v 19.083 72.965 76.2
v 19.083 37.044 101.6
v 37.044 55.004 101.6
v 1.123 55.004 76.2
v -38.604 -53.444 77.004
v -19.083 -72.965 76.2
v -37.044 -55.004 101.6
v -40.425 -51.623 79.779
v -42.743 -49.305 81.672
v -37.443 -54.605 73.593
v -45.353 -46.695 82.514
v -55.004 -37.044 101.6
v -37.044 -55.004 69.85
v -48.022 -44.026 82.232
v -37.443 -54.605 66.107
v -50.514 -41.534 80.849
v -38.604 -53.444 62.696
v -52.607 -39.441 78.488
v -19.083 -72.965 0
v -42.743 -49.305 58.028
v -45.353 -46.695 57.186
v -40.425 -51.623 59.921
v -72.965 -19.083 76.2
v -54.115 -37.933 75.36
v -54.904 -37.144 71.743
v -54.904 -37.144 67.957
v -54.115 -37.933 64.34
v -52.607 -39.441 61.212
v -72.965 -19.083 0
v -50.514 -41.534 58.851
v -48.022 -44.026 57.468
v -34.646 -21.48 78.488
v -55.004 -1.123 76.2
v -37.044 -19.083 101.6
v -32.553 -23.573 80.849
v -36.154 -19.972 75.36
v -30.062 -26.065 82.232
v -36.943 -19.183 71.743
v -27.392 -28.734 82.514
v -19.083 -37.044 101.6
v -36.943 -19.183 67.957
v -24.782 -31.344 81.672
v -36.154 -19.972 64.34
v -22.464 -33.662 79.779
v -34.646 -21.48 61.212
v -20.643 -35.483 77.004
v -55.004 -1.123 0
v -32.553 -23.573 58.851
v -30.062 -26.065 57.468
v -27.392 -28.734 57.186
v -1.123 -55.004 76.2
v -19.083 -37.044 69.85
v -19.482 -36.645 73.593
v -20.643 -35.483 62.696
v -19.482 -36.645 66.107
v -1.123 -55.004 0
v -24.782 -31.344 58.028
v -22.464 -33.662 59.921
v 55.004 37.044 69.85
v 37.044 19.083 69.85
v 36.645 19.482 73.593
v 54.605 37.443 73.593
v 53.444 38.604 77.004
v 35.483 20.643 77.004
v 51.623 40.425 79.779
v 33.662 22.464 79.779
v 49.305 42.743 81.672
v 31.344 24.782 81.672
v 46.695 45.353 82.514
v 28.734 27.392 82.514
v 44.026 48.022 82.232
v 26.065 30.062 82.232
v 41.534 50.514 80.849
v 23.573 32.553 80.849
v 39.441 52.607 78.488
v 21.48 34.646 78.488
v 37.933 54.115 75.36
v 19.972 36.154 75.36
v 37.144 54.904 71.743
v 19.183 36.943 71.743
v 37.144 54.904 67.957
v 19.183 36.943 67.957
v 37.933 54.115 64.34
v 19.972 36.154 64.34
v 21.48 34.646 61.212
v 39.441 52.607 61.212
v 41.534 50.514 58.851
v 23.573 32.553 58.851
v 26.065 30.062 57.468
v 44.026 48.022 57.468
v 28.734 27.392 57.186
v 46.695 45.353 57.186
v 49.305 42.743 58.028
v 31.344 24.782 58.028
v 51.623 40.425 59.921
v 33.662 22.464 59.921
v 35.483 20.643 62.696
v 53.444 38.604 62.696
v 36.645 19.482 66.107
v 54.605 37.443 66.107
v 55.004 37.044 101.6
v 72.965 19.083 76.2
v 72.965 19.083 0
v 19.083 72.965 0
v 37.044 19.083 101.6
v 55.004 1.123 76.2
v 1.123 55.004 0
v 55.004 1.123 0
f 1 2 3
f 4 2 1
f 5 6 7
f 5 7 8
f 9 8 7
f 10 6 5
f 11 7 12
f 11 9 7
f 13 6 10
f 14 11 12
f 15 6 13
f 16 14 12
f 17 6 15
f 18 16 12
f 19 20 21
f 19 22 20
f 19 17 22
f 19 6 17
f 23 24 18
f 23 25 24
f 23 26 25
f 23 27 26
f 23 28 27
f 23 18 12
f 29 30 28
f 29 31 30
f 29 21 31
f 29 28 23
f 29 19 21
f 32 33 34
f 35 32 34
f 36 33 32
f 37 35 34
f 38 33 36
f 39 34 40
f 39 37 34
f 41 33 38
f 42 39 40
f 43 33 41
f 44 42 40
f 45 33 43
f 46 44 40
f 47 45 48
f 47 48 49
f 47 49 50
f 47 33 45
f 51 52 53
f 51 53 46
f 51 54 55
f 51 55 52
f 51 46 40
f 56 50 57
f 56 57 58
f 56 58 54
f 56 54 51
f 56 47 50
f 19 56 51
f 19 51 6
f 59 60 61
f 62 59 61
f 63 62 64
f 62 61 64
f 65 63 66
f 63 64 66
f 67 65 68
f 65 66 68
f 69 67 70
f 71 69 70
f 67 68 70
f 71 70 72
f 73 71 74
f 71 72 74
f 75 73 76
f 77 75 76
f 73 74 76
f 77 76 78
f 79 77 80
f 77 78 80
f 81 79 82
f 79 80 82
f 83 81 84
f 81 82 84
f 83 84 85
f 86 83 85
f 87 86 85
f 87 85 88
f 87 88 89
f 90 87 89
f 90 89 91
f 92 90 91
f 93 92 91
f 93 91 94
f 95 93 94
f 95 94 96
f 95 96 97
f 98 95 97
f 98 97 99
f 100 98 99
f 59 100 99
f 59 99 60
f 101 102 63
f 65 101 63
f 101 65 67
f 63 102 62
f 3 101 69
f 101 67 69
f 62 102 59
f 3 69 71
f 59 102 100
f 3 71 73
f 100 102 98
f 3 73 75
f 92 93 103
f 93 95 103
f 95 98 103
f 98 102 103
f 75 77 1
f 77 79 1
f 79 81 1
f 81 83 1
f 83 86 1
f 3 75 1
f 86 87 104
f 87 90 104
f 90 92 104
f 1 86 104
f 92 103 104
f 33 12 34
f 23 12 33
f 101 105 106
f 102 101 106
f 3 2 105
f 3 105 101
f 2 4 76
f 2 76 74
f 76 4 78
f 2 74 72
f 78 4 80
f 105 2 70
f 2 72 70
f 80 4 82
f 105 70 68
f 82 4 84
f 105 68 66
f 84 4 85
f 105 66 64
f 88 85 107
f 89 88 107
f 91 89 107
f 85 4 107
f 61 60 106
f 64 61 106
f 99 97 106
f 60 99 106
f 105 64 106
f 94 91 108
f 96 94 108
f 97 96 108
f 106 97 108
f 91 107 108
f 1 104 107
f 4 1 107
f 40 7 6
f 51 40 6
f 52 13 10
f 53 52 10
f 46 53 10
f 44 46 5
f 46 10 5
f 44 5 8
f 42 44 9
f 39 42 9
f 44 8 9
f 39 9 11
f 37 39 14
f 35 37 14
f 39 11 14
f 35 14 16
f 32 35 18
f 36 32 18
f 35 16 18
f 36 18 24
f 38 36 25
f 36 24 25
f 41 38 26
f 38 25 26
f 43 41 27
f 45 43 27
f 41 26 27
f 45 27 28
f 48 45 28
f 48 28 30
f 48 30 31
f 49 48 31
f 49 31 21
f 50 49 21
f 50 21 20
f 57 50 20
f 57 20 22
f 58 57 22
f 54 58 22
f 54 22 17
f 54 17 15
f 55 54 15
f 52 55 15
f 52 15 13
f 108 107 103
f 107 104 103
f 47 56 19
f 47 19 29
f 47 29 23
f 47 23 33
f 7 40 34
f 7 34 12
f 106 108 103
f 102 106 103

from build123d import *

# Parameters (mm, degrees)
EXTRUDE1_DEPTH     = 101.6
EXTRUDE1_2_DEPTH   = 101.6
SKETCH2_R          = 12.7
CUT_EXTRUDE1_DEPTH = 197.56814499


with BuildPart() as part:
    # Sketch1 → Extrude1 (new body)
    with BuildSketch(Plane.XY):
        Polygon((-55.004068742, -1.122532015), (-1.122532015, -55.004068742), (-19.083044257, -72.964580984), (-72.964580984, -19.083044257), align=None)
    extrude(amount=EXTRUDE1_DEPTH)


with BuildPart() as body_2:
    # Sketch1 → Extrude1 2 (new body)
    with BuildSketch(Plane.XY):
        Polygon((1.122532015, 55.004068742), (55.004068742, 1.122532015), (72.964580984, 19.083044257), (19.083044257, 72.964580984), align=None)
    extrude(amount=EXTRUDE1_2_DEPTH)


with BuildPart() as cut_extrude1_tool:
    # Sketch2 → Cut-Extrude1 (new, through all)
    with BuildSketch(Plane(origin=(-46.02381262, -46.02381262, 0), x_dir=(0.7071067811865462, -0.7071067811865488, 0), z_dir=(-0.7071067811865488, -0.7071067811865462, 0))):
        with Locations((0, 69.85)):
            Circle(SKETCH2_R)
        Polygon((-12.7, 101.6), (-38.1, 76.2), (-38.1, 101.6), align=None)
        Polygon((12.7, 101.6), (38.1, 76.2), (38.1, 101.6), align=None)
    extrude(amount=-CUT_EXTRUDE1_DEPTH)


with BuildPart() as part_1:
    add(part.part)

    # Cut-Extrude1: cut by cut_extrude1_tool
    add(cut_extrude1_tool.part, mode=Mode.SUBTRACT)


with BuildPart() as body_2_1:
    add(body_2.part)

    # Cut-Extrude1: cut by cut_extrude1_tool
    add(cut_extrude1_tool.part, mode=Mode.SUBTRACT)


solid = Compound([part_1.part, body_2_1.part])
